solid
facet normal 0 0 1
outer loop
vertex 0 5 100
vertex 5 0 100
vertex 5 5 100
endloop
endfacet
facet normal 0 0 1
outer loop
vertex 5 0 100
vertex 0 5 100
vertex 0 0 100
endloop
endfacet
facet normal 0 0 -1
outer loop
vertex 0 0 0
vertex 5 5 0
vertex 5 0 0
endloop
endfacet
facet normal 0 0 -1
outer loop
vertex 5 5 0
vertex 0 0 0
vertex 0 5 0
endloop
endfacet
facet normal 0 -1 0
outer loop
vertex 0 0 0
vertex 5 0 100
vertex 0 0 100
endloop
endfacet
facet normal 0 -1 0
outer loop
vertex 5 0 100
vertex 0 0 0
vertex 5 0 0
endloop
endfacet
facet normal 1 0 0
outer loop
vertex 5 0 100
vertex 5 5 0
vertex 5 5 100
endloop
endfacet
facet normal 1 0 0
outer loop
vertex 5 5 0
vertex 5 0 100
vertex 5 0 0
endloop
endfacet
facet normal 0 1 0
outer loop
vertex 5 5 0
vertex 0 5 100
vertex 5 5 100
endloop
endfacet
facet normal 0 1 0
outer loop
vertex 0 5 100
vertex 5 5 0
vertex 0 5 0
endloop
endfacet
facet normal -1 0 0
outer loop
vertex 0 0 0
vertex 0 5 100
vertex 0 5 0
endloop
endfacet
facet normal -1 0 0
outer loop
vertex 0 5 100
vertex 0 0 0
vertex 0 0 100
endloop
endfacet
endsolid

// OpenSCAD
stand_sz_x = 5;
stand_sz_y = 5;
stand_sz_z = 100;

cube([stand_sz_x, stand_sz_y, stand_sz_z]);
